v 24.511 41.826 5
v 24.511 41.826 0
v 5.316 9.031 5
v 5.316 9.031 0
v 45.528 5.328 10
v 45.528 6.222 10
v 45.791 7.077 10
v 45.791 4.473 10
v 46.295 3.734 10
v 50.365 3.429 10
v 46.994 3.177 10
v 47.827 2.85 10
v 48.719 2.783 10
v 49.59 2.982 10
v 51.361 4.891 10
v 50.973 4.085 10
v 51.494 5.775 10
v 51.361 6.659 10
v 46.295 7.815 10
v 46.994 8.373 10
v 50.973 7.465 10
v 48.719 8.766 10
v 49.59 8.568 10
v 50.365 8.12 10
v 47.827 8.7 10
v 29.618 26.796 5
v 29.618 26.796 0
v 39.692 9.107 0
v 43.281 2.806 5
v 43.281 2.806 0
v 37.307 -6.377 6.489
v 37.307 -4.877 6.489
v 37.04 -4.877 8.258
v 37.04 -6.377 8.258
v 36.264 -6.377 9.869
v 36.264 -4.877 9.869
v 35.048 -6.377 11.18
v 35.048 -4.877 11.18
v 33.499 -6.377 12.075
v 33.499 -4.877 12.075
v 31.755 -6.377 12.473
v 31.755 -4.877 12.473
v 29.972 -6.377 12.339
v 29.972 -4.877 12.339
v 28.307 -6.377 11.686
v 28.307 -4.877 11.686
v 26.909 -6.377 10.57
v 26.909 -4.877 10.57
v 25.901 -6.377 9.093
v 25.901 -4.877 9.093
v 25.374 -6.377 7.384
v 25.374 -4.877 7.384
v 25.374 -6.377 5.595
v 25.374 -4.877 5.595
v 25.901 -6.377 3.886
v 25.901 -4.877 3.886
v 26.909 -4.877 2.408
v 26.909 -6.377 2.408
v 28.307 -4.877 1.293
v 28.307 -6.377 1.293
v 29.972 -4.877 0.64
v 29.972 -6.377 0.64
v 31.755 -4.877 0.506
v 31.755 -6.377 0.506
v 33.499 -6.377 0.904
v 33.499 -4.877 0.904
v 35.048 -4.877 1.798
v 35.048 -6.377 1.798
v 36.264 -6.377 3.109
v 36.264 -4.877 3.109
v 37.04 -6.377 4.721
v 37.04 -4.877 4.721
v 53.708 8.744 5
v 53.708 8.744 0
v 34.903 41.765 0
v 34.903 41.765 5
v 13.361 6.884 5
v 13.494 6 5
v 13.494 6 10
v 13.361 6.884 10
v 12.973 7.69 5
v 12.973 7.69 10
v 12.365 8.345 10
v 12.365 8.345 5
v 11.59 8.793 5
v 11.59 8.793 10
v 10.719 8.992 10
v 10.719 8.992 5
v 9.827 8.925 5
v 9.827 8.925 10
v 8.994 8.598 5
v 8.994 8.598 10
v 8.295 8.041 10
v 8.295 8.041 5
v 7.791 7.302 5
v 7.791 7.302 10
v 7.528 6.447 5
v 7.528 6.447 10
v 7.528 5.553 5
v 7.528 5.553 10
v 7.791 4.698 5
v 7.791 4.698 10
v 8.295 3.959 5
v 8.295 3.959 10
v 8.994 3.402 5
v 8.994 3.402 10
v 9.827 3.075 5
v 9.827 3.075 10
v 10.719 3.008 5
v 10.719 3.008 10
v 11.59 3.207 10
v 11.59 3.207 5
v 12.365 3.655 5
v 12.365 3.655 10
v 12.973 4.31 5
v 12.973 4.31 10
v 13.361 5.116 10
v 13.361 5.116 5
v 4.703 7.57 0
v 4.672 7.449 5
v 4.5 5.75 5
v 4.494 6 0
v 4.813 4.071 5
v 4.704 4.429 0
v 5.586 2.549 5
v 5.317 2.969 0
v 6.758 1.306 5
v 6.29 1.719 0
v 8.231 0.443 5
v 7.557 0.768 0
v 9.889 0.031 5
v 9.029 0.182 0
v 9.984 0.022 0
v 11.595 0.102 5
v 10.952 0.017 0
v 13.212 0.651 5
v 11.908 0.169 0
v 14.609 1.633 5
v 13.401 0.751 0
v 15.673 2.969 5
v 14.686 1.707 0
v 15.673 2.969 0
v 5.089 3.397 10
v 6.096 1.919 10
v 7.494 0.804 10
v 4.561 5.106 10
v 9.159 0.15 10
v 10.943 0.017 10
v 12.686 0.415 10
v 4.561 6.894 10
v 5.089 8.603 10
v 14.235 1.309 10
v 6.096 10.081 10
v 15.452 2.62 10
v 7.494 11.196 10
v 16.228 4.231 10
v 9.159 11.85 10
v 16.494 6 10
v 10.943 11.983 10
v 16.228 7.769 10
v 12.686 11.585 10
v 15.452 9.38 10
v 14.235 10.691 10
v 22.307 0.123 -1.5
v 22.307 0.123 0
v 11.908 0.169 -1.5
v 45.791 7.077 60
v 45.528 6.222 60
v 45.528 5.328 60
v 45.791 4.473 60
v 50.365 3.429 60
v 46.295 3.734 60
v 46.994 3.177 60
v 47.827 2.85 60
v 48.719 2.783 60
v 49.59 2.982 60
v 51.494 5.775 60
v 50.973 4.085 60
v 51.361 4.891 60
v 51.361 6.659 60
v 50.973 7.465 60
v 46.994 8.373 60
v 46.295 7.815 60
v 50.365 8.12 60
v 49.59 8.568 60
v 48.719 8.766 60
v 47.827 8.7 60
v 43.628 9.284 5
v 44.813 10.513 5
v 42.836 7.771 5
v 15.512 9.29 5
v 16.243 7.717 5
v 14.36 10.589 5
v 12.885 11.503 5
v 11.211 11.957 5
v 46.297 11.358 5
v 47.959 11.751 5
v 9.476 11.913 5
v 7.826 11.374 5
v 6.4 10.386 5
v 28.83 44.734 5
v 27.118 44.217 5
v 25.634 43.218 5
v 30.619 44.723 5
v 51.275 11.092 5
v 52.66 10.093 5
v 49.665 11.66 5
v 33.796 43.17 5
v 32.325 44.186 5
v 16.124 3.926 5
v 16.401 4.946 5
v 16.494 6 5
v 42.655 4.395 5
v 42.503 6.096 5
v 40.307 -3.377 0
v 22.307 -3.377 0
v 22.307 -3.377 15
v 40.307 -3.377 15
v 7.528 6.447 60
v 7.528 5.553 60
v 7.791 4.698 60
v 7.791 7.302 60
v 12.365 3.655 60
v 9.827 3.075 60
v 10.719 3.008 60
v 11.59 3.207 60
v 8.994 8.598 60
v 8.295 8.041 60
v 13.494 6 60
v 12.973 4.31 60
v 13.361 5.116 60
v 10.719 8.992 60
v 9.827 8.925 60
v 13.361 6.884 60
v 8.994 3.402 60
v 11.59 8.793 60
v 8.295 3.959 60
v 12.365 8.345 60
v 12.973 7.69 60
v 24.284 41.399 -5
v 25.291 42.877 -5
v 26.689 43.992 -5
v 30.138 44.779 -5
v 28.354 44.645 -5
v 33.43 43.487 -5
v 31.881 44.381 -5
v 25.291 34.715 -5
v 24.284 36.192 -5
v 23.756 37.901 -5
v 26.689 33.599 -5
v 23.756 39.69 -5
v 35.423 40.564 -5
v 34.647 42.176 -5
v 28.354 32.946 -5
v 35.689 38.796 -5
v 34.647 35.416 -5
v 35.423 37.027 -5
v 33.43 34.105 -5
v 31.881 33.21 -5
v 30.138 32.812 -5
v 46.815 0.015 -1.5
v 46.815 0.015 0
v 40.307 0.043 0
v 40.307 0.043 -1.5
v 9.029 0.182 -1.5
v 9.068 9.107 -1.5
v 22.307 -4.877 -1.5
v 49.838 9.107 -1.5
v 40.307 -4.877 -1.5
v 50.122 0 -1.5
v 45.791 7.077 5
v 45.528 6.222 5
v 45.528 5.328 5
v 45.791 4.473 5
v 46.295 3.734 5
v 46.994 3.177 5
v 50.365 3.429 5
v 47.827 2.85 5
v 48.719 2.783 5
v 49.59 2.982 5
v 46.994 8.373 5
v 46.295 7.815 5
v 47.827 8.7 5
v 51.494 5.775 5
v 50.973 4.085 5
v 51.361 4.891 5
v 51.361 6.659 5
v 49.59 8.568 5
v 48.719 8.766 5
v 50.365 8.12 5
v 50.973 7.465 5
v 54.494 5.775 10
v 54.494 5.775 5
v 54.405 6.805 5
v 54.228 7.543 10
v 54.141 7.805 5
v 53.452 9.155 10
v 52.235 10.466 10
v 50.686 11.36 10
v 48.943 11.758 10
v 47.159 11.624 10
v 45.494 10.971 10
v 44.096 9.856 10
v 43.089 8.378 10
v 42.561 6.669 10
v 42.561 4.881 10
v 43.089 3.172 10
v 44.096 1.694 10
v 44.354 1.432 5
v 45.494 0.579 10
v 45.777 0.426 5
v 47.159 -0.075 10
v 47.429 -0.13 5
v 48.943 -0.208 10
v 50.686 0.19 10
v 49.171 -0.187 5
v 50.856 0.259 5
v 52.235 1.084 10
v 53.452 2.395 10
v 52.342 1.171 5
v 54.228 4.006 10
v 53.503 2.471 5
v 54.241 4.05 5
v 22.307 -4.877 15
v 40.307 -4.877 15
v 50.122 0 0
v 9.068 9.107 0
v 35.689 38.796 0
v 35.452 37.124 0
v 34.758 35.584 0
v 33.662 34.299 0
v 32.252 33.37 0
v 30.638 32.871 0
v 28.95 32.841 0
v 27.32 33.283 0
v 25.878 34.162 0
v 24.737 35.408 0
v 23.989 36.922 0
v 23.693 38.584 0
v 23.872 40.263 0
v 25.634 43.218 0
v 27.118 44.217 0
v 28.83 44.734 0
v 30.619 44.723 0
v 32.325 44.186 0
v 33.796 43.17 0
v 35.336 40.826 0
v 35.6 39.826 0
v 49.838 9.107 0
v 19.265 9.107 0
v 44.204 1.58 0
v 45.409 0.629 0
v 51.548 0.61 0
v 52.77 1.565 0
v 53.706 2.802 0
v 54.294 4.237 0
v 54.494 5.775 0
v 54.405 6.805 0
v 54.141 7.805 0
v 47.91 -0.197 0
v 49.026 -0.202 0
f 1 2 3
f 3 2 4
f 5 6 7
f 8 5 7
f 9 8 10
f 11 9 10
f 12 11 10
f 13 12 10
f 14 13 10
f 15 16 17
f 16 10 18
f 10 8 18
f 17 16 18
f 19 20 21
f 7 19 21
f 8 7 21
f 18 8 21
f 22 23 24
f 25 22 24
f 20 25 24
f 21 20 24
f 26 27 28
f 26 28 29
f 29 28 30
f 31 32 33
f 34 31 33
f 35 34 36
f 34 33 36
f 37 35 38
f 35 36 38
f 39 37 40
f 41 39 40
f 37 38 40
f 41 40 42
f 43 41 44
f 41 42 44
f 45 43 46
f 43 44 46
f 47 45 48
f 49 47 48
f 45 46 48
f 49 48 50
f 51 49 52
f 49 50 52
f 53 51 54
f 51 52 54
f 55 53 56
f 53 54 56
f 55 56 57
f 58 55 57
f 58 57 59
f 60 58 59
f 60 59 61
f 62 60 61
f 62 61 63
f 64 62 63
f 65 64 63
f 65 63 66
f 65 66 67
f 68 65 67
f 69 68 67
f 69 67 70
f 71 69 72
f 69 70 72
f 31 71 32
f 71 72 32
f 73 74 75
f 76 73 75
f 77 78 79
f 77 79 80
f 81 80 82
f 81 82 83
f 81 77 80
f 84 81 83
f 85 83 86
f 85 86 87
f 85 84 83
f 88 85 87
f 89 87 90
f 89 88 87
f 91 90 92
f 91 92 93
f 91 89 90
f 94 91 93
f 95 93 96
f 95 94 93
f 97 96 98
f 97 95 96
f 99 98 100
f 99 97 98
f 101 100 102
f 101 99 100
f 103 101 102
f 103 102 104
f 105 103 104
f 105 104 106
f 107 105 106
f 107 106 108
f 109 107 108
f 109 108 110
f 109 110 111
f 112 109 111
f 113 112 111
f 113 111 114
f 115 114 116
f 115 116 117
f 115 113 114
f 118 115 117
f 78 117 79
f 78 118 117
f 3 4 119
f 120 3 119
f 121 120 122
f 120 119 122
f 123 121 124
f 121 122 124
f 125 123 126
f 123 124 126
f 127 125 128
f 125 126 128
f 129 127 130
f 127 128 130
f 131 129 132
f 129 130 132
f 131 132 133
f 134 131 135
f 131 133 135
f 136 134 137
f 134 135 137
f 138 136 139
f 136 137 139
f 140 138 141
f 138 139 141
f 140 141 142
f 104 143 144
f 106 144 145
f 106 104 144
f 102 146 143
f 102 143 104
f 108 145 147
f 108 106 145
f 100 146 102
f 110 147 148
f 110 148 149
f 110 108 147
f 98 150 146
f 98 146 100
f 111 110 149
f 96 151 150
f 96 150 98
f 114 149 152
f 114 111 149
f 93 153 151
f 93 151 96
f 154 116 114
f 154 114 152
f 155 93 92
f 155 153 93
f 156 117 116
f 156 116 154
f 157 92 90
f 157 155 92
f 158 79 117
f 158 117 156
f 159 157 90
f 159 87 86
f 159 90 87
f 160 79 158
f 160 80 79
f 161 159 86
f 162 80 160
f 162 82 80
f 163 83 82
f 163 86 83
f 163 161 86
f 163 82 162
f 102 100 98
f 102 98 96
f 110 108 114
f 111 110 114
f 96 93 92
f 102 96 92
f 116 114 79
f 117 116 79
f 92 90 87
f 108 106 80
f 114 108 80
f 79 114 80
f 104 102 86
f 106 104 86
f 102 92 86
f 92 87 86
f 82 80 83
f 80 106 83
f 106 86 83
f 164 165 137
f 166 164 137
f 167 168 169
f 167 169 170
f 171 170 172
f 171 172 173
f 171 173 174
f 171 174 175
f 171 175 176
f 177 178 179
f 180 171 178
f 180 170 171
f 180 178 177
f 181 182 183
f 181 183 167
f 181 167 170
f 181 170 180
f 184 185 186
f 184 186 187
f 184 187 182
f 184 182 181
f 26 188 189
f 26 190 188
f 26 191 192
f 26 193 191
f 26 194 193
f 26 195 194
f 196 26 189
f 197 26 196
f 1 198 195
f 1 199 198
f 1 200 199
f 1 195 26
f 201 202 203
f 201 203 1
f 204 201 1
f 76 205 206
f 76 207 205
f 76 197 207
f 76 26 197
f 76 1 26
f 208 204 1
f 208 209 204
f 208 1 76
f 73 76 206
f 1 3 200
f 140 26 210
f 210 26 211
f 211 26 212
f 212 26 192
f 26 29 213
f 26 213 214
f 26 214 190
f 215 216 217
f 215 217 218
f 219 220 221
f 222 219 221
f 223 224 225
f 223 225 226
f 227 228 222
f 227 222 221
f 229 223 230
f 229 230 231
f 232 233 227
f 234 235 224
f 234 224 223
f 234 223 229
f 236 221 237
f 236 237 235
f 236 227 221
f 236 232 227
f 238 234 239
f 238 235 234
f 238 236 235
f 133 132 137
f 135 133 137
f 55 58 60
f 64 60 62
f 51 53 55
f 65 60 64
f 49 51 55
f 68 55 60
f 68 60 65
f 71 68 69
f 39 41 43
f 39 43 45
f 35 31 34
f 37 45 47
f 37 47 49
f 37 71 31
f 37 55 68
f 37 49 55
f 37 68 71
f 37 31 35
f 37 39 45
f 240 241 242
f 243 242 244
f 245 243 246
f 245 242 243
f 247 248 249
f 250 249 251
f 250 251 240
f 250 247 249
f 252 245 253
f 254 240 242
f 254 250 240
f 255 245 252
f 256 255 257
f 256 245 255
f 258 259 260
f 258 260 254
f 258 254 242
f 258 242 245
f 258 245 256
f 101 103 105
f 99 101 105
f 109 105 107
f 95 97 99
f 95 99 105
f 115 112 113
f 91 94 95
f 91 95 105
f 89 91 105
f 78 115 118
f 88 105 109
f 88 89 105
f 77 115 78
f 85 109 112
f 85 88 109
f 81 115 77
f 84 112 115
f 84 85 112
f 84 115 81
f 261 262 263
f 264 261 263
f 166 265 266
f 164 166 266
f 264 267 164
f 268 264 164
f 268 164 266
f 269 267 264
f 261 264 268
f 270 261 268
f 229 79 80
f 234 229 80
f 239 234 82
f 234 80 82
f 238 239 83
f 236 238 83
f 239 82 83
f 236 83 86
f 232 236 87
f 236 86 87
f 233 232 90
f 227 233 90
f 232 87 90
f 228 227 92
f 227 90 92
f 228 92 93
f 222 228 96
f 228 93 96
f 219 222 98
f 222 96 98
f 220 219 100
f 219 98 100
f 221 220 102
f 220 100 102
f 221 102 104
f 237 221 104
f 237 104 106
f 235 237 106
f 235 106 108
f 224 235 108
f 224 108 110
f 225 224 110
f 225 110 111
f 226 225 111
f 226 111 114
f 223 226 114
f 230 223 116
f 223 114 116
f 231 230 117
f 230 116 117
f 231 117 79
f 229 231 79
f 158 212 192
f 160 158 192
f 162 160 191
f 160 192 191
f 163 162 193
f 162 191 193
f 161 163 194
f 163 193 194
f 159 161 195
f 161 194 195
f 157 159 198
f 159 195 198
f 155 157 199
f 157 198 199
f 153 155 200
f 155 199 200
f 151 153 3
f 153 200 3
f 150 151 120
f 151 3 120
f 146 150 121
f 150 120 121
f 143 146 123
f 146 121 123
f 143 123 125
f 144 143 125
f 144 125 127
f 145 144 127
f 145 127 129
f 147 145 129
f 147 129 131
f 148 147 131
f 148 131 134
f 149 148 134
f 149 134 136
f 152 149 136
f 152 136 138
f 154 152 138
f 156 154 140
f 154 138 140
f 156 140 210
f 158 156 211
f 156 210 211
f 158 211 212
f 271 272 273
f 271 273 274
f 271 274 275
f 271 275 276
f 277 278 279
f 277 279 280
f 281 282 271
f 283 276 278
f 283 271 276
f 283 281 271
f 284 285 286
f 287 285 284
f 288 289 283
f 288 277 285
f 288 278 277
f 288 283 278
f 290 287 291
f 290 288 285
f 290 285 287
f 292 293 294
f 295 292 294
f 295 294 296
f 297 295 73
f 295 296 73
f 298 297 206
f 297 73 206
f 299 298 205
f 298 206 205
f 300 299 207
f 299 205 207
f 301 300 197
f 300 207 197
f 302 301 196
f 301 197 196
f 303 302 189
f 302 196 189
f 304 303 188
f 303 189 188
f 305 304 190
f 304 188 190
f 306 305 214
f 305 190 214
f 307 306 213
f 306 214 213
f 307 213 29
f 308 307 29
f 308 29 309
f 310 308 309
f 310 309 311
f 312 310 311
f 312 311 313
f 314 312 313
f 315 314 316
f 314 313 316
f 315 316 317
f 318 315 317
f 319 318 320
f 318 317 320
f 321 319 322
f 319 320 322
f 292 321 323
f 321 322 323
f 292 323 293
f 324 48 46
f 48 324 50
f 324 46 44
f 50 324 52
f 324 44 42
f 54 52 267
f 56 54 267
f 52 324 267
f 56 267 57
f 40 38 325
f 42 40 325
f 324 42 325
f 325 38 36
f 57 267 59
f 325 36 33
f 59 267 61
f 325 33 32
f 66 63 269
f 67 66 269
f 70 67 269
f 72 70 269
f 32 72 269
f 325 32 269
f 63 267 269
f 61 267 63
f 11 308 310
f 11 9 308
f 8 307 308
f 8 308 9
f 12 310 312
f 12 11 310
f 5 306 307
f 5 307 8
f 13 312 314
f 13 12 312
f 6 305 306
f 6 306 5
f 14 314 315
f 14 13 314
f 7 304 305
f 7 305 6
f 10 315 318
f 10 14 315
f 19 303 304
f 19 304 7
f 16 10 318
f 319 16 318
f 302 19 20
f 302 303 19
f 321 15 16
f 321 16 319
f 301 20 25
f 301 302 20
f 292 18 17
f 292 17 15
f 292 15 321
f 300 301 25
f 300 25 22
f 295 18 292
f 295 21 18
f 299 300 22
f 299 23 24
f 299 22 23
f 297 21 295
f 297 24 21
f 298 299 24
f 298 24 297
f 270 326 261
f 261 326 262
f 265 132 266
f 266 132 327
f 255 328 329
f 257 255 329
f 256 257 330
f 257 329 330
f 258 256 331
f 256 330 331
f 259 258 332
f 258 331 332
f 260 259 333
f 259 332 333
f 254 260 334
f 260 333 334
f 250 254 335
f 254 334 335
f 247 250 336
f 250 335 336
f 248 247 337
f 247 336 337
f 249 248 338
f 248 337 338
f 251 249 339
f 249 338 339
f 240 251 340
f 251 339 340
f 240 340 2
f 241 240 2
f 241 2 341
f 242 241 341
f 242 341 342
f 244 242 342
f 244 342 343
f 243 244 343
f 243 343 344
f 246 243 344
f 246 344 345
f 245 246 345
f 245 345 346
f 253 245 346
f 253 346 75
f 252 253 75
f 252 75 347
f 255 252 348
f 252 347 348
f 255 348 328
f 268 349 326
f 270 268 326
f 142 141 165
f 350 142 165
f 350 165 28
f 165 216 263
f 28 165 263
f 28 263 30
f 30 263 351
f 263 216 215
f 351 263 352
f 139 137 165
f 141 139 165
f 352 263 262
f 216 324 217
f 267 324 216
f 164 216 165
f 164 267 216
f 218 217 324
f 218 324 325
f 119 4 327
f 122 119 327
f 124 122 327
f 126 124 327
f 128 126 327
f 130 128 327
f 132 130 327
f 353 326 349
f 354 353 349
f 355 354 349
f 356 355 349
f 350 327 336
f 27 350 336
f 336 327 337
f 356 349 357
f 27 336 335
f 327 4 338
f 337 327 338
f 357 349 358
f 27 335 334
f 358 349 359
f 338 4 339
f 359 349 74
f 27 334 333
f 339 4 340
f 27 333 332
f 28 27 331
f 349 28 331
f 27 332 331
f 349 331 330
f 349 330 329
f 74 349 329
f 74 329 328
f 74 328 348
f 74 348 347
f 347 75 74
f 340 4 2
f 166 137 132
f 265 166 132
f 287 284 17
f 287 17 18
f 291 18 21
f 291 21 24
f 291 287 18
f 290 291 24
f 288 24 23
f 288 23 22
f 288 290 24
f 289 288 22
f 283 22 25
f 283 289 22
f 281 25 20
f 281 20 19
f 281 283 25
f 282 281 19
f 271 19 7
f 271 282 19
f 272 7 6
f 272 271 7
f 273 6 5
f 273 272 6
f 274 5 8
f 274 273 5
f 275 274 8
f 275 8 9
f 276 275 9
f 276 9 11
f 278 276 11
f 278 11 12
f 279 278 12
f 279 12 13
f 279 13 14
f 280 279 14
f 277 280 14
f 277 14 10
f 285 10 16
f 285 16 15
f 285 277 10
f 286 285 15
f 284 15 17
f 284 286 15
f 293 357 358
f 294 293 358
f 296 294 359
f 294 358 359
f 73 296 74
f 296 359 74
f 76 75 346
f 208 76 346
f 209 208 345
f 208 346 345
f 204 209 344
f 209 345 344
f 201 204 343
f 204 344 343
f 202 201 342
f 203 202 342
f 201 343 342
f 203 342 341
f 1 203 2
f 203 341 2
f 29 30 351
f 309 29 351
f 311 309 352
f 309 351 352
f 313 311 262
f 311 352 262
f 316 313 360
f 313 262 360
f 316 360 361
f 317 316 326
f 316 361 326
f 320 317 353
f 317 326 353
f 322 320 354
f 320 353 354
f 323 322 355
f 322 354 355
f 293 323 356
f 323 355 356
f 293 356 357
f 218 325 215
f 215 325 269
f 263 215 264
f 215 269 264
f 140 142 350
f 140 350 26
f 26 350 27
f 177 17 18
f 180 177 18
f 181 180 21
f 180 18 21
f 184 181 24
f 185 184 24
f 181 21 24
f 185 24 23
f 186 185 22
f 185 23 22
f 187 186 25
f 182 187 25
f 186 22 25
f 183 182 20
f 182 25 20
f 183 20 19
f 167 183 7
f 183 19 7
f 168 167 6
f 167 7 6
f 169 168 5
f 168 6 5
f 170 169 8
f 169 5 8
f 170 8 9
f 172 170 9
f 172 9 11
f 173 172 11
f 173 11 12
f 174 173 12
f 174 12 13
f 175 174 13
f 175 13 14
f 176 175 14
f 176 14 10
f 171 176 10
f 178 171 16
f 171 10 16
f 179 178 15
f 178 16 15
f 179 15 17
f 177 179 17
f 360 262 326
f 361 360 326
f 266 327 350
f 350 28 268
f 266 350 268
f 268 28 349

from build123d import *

# Parameters (mm, degrees)
F1_DEPTH  = 5
F2_R      = 6
F3_DEPTH  = 5
F4_R      = 6
F4_R_2    = 3
F5_DEPTH  = 5
F6_R      = 3
F7_DEPTH  = 50
F9_DEPTH  = 1.5
F10_W     = 18
F10_H     = 5
F11_DEPTH = 1.5
F12_W     = 15
F12_H     = 1.5
F13_DEPTH = 15
F12_W_2   = 18
F14_R     = 5.6748584426
F15_DEPTH = 1
F16_R     = 6
F17_DEPTH = 1.5


with BuildPart() as f1:
    # F0 (on Top) → F1 (new body)
    with BuildSketch(Plane.XY):
        with BuildLine():
            ThreePointArc((43.2805742568, 2.8056639072), (45.5251597381, 10.9886851107), (53.7081809416, 8.7440996295))
            Line((53.7081809416, 8.7440996295), (34.9031344877, 41.7648541313))
            ThreePointArc((34.9031344877, 41.7648541313), (35.4894526981, 40.3314064264), (35.6893311454, 38.7956362701))
            ThreePointArc((35.6893311454, 38.7956362701), (28.1192276696, 33.004714489), (24.5110727869, 41.826418409))
            Line((24.5110727869, 41.826418409), (5.3161192408, 9.0307821389))
            ThreePointArc((5.3161192408, 9.0307821389), (12.064481075, 11.7909217811), (16.4943775992, 6))
            ThreePointArc((16.4943775992, 6), (16.2852993804, 4.4298965242), (15.6726359577, 2.9692178611))
            Line((15.6726359577, 2.9692178611), (29.6182436723, 26.796057404))
            Line((29.6182436723, 26.796057404), (43.2805742568, 2.8056639072))
        make_face()
        with BuildLine():
            ThreePointArc((54.4943775992, 5.7748817683), (54.294499152, 7.3106519246), (53.7081809416, 8.7440996295))
            ThreePointArc((53.7081809416, 8.7440996295), (45.5251597381, 10.9886851107), (43.2805742568, 2.8056639072))
            ThreePointArc((43.2805742568, 2.8056639072), (50.0301477555, -0.0252397845), (54.4943775992, 5.7748817683))
        make_face()
        with BuildLine():
            ThreePointArc((35.6893311454, 38.7956362701), (35.4894526981, 40.3314064264), (34.9031344877, 41.7648541313))
            ThreePointArc((34.9031344877, 41.7648541313), (29.7248755056, 44.7955309857), (24.5110727869, 41.826418409))
            ThreePointArc((24.5110727869, 41.826418409), (28.1192276696, 33.004714489), (35.6893311454, 38.7956362701))
        make_face()
        with BuildLine():
            ThreePointArc((16.4943775992, 6), (12.064481075, 11.7909217811), (5.3161192408, 9.0307821389))
            ThreePointArc((5.3161192408, 9.0307821389), (7.4635954604, 0.8217416416), (15.6726359577, 2.9692178611))
            ThreePointArc((15.6726359577, 2.9692178611), (16.2852993804, 4.4298965242), (16.4943775992, 6))
        make_face()
    extrude(amount=F1_DEPTH)

    # F2 (on face) → F3 (join)
    with BuildSketch(Plane(origin=(0, 0, 0), x_dir=(1, 0, 0), z_dir=(0, 0, -1))):
        with Locations((29.6893311454, -38.7956362701)):
            Circle(F2_R)
    extrude(amount=F3_DEPTH)

    # F4 (on face) → F5 (join)
    with BuildSketch(Plane.XY.offset(5)):
        with Locations((10.4943775992, 6)):
            Circle(F4_R)
        with Locations((10.4943775992, 6)):
            Circle(F4_R_2, mode=Mode.SUBTRACT)
        with Locations((48.4943775992, 5.7748817683)):
            Circle(F4_R)
        with Locations((48.4943775992, 5.7748817683)):
            Circle(F4_R_2, mode=Mode.SUBTRACT)
    extrude(amount=F5_DEPTH)

    # F8 (on face) → F9 (join)
    with BuildSketch(Plane(origin=(0, 0, 0), x_dir=(1, 0, 0), z_dir=(0, 0, -1))):
        with BuildLine():
            Line((49.8381815851, -9.1067121526), (50.1224871047, 0))
            Line((50.1224871047, 0), (46.8152641434, -0.014623267))
            ThreePointArc((46.8152641434, -0.014623267), (44.77610482, -1.0659065571), (43.2805742568, -2.8056639072))
            Line((43.2805742568, -2.8056639072), (39.69217942, -9.1067121526))
            Line((39.69217942, -9.1067121526), (49.8381815851, -9.1067121526))
        make_face()
        with BuildLine():
            ThreePointArc((15.6726359577, -2.9692178611), (14.075500288, -1.1858998465), (11.9082632669, -0.1689685888))
            Line((11.9082632669, -0.1689685888), (9.0289830705, -0.1816996575))
            Line((9.0289830705, -0.1816996575), (9.0684460404, -9.1067121526))
            Line((9.0684460404, -9.1067121526), (19.2648491669, -9.1067121526))
            Line((19.2648491669, -9.1067121526), (15.6726359577, -2.9692178611))
        make_face()
        with BuildLine():
            ThreePointArc((43.2805742568, -2.8056639072), (44.77610482, -1.0659065571), (46.8152641434, -0.014623267))
            Line((46.8152641434, -0.014623267), (11.9082632669, -0.1689685888))
            ThreePointArc((11.9082632669, -0.1689685888), (14.075500288, -1.1858998465), (15.6726359577, -2.9692178611))
            Line((15.6726359577, -2.9692178611), (19.2648491669, -9.1067121526))
            Line((19.2648491669, -9.1067121526), (39.69217942, -9.1067121526))
            Line((39.69217942, -9.1067121526), (43.2805742568, -2.8056639072))
        make_face()
    extrude(amount=F9_DEPTH)

    # F10 (on face) → F11 (join)
    with BuildSketch(Plane(origin=(0, 0, -1.5), x_dir=(1, 0, 0), z_dir=(0, 0, -1))):
        with Locations((31.3069072107, 2.3770102122)):
            Rectangle(F10_W, F10_H)
    extrude(amount=-F11_DEPTH)

    # F12 (on face) → F13, piece 2 (join)
    with BuildSketch(Plane.XY):
        with Locations((31.3069072107, -4.1270102122)):
            Rectangle(F12_W_2, F12_H)
    extrude(amount=F13_DEPTH)

    # F16 (on face) → F17 (join)
    with BuildSketch(Plane.XZ.offset(4.8770102122)):
        with Locations((31.3069072107, 6.4893988892)):
            Circle(F16_R)
    extrude(amount=F17_DEPTH)


with BuildPart() as f7:
    # F6 (on face) → F7 (new body)
    with BuildSketch(Plane.XY.offset(10)):
        with Locations((48.4943775992, 5.7748817683)):
            Circle(F6_R)
    extrude(amount=F7_DEPTH)


with BuildPart() as f7b:
    # F6 (on face) → F7, piece 2 (new body)
    with BuildSketch(Plane.XY.offset(10)):
        with Locations((10.4943775992, 6)):
            Circle(F6_R)
    extrude(amount=F7_DEPTH)


with BuildPart() as f13:
    # F12 (on face) → F13 (new body)
    with BuildSketch(Plane.XY):
        with Locations((2585.3193696775, -10.4265026783)):
            Rectangle(F12_W, F12_H)
    extrude(amount=F13_DEPTH)

    # F14 (on face) → F15 (join)
    with BuildSketch(Plane.XZ.offset(11.1765026783)):
        with Locations((2585.3193696775, 7.1355714463)):
            Circle(F14_R)
    extrude(amount=F15_DEPTH)


solid = Compound([f1.part, f7.part, f7b.part])
